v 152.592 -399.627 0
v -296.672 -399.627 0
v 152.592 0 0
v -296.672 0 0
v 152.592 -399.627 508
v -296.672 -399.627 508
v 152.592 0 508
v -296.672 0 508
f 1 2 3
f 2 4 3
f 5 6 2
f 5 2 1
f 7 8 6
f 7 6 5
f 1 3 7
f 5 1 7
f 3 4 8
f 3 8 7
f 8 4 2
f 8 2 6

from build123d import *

# Parameters (mm, degrees)
F1_W      = 449.263618
F1_H      = 145.62732
F2_DEPTH  = 508
F2_FACE_W = 449.263618
F2_FACE_H = 508
F3_DEPTH  = 254
F3_FACE_W = 449.263618
F3_FACE_H = 399.62732
F4_DEPTH  = 127
F5_DEPTH  = 127


with BuildPart() as f2:
    # F1 (on face) → F2 (new body)
    with BuildSketch(Plane.XY):
        with Locations((-72.040029, -72.81366)):
            Rectangle(F1_W, F1_H)
    extrude(amount=F2_DEPTH)

    # F2_face (on face) → F3 (join)
    with BuildSketch(Plane(origin=(-72.040029, -145.62732, 254), x_dir=(1, 0, 0), z_dir=(0, -1, 0))):
        Rectangle(F2_FACE_W, F2_FACE_H)
    extrude(amount=F3_DEPTH)

    # F3_face (on face) → F4 (join)
    with BuildSketch(Plane(origin=(-72.040029, -199.81366, 0), x_dir=(1, 0, 0), z_dir=(0, 0, -1))):
        Rectangle(F3_FACE_W, F3_FACE_H)
    extrude(amount=-F4_DEPTH)

    # F3_face (on face) → F5 (join)
    with BuildSketch(Plane(origin=(-72.040029, -199.81366, 0), x_dir=(1, 0, 0), z_dir=(0, 0, -1))):
        Rectangle(F3_FACE_W, F3_FACE_H)
    extrude(amount=-F5_DEPTH)


solid = f2.part
